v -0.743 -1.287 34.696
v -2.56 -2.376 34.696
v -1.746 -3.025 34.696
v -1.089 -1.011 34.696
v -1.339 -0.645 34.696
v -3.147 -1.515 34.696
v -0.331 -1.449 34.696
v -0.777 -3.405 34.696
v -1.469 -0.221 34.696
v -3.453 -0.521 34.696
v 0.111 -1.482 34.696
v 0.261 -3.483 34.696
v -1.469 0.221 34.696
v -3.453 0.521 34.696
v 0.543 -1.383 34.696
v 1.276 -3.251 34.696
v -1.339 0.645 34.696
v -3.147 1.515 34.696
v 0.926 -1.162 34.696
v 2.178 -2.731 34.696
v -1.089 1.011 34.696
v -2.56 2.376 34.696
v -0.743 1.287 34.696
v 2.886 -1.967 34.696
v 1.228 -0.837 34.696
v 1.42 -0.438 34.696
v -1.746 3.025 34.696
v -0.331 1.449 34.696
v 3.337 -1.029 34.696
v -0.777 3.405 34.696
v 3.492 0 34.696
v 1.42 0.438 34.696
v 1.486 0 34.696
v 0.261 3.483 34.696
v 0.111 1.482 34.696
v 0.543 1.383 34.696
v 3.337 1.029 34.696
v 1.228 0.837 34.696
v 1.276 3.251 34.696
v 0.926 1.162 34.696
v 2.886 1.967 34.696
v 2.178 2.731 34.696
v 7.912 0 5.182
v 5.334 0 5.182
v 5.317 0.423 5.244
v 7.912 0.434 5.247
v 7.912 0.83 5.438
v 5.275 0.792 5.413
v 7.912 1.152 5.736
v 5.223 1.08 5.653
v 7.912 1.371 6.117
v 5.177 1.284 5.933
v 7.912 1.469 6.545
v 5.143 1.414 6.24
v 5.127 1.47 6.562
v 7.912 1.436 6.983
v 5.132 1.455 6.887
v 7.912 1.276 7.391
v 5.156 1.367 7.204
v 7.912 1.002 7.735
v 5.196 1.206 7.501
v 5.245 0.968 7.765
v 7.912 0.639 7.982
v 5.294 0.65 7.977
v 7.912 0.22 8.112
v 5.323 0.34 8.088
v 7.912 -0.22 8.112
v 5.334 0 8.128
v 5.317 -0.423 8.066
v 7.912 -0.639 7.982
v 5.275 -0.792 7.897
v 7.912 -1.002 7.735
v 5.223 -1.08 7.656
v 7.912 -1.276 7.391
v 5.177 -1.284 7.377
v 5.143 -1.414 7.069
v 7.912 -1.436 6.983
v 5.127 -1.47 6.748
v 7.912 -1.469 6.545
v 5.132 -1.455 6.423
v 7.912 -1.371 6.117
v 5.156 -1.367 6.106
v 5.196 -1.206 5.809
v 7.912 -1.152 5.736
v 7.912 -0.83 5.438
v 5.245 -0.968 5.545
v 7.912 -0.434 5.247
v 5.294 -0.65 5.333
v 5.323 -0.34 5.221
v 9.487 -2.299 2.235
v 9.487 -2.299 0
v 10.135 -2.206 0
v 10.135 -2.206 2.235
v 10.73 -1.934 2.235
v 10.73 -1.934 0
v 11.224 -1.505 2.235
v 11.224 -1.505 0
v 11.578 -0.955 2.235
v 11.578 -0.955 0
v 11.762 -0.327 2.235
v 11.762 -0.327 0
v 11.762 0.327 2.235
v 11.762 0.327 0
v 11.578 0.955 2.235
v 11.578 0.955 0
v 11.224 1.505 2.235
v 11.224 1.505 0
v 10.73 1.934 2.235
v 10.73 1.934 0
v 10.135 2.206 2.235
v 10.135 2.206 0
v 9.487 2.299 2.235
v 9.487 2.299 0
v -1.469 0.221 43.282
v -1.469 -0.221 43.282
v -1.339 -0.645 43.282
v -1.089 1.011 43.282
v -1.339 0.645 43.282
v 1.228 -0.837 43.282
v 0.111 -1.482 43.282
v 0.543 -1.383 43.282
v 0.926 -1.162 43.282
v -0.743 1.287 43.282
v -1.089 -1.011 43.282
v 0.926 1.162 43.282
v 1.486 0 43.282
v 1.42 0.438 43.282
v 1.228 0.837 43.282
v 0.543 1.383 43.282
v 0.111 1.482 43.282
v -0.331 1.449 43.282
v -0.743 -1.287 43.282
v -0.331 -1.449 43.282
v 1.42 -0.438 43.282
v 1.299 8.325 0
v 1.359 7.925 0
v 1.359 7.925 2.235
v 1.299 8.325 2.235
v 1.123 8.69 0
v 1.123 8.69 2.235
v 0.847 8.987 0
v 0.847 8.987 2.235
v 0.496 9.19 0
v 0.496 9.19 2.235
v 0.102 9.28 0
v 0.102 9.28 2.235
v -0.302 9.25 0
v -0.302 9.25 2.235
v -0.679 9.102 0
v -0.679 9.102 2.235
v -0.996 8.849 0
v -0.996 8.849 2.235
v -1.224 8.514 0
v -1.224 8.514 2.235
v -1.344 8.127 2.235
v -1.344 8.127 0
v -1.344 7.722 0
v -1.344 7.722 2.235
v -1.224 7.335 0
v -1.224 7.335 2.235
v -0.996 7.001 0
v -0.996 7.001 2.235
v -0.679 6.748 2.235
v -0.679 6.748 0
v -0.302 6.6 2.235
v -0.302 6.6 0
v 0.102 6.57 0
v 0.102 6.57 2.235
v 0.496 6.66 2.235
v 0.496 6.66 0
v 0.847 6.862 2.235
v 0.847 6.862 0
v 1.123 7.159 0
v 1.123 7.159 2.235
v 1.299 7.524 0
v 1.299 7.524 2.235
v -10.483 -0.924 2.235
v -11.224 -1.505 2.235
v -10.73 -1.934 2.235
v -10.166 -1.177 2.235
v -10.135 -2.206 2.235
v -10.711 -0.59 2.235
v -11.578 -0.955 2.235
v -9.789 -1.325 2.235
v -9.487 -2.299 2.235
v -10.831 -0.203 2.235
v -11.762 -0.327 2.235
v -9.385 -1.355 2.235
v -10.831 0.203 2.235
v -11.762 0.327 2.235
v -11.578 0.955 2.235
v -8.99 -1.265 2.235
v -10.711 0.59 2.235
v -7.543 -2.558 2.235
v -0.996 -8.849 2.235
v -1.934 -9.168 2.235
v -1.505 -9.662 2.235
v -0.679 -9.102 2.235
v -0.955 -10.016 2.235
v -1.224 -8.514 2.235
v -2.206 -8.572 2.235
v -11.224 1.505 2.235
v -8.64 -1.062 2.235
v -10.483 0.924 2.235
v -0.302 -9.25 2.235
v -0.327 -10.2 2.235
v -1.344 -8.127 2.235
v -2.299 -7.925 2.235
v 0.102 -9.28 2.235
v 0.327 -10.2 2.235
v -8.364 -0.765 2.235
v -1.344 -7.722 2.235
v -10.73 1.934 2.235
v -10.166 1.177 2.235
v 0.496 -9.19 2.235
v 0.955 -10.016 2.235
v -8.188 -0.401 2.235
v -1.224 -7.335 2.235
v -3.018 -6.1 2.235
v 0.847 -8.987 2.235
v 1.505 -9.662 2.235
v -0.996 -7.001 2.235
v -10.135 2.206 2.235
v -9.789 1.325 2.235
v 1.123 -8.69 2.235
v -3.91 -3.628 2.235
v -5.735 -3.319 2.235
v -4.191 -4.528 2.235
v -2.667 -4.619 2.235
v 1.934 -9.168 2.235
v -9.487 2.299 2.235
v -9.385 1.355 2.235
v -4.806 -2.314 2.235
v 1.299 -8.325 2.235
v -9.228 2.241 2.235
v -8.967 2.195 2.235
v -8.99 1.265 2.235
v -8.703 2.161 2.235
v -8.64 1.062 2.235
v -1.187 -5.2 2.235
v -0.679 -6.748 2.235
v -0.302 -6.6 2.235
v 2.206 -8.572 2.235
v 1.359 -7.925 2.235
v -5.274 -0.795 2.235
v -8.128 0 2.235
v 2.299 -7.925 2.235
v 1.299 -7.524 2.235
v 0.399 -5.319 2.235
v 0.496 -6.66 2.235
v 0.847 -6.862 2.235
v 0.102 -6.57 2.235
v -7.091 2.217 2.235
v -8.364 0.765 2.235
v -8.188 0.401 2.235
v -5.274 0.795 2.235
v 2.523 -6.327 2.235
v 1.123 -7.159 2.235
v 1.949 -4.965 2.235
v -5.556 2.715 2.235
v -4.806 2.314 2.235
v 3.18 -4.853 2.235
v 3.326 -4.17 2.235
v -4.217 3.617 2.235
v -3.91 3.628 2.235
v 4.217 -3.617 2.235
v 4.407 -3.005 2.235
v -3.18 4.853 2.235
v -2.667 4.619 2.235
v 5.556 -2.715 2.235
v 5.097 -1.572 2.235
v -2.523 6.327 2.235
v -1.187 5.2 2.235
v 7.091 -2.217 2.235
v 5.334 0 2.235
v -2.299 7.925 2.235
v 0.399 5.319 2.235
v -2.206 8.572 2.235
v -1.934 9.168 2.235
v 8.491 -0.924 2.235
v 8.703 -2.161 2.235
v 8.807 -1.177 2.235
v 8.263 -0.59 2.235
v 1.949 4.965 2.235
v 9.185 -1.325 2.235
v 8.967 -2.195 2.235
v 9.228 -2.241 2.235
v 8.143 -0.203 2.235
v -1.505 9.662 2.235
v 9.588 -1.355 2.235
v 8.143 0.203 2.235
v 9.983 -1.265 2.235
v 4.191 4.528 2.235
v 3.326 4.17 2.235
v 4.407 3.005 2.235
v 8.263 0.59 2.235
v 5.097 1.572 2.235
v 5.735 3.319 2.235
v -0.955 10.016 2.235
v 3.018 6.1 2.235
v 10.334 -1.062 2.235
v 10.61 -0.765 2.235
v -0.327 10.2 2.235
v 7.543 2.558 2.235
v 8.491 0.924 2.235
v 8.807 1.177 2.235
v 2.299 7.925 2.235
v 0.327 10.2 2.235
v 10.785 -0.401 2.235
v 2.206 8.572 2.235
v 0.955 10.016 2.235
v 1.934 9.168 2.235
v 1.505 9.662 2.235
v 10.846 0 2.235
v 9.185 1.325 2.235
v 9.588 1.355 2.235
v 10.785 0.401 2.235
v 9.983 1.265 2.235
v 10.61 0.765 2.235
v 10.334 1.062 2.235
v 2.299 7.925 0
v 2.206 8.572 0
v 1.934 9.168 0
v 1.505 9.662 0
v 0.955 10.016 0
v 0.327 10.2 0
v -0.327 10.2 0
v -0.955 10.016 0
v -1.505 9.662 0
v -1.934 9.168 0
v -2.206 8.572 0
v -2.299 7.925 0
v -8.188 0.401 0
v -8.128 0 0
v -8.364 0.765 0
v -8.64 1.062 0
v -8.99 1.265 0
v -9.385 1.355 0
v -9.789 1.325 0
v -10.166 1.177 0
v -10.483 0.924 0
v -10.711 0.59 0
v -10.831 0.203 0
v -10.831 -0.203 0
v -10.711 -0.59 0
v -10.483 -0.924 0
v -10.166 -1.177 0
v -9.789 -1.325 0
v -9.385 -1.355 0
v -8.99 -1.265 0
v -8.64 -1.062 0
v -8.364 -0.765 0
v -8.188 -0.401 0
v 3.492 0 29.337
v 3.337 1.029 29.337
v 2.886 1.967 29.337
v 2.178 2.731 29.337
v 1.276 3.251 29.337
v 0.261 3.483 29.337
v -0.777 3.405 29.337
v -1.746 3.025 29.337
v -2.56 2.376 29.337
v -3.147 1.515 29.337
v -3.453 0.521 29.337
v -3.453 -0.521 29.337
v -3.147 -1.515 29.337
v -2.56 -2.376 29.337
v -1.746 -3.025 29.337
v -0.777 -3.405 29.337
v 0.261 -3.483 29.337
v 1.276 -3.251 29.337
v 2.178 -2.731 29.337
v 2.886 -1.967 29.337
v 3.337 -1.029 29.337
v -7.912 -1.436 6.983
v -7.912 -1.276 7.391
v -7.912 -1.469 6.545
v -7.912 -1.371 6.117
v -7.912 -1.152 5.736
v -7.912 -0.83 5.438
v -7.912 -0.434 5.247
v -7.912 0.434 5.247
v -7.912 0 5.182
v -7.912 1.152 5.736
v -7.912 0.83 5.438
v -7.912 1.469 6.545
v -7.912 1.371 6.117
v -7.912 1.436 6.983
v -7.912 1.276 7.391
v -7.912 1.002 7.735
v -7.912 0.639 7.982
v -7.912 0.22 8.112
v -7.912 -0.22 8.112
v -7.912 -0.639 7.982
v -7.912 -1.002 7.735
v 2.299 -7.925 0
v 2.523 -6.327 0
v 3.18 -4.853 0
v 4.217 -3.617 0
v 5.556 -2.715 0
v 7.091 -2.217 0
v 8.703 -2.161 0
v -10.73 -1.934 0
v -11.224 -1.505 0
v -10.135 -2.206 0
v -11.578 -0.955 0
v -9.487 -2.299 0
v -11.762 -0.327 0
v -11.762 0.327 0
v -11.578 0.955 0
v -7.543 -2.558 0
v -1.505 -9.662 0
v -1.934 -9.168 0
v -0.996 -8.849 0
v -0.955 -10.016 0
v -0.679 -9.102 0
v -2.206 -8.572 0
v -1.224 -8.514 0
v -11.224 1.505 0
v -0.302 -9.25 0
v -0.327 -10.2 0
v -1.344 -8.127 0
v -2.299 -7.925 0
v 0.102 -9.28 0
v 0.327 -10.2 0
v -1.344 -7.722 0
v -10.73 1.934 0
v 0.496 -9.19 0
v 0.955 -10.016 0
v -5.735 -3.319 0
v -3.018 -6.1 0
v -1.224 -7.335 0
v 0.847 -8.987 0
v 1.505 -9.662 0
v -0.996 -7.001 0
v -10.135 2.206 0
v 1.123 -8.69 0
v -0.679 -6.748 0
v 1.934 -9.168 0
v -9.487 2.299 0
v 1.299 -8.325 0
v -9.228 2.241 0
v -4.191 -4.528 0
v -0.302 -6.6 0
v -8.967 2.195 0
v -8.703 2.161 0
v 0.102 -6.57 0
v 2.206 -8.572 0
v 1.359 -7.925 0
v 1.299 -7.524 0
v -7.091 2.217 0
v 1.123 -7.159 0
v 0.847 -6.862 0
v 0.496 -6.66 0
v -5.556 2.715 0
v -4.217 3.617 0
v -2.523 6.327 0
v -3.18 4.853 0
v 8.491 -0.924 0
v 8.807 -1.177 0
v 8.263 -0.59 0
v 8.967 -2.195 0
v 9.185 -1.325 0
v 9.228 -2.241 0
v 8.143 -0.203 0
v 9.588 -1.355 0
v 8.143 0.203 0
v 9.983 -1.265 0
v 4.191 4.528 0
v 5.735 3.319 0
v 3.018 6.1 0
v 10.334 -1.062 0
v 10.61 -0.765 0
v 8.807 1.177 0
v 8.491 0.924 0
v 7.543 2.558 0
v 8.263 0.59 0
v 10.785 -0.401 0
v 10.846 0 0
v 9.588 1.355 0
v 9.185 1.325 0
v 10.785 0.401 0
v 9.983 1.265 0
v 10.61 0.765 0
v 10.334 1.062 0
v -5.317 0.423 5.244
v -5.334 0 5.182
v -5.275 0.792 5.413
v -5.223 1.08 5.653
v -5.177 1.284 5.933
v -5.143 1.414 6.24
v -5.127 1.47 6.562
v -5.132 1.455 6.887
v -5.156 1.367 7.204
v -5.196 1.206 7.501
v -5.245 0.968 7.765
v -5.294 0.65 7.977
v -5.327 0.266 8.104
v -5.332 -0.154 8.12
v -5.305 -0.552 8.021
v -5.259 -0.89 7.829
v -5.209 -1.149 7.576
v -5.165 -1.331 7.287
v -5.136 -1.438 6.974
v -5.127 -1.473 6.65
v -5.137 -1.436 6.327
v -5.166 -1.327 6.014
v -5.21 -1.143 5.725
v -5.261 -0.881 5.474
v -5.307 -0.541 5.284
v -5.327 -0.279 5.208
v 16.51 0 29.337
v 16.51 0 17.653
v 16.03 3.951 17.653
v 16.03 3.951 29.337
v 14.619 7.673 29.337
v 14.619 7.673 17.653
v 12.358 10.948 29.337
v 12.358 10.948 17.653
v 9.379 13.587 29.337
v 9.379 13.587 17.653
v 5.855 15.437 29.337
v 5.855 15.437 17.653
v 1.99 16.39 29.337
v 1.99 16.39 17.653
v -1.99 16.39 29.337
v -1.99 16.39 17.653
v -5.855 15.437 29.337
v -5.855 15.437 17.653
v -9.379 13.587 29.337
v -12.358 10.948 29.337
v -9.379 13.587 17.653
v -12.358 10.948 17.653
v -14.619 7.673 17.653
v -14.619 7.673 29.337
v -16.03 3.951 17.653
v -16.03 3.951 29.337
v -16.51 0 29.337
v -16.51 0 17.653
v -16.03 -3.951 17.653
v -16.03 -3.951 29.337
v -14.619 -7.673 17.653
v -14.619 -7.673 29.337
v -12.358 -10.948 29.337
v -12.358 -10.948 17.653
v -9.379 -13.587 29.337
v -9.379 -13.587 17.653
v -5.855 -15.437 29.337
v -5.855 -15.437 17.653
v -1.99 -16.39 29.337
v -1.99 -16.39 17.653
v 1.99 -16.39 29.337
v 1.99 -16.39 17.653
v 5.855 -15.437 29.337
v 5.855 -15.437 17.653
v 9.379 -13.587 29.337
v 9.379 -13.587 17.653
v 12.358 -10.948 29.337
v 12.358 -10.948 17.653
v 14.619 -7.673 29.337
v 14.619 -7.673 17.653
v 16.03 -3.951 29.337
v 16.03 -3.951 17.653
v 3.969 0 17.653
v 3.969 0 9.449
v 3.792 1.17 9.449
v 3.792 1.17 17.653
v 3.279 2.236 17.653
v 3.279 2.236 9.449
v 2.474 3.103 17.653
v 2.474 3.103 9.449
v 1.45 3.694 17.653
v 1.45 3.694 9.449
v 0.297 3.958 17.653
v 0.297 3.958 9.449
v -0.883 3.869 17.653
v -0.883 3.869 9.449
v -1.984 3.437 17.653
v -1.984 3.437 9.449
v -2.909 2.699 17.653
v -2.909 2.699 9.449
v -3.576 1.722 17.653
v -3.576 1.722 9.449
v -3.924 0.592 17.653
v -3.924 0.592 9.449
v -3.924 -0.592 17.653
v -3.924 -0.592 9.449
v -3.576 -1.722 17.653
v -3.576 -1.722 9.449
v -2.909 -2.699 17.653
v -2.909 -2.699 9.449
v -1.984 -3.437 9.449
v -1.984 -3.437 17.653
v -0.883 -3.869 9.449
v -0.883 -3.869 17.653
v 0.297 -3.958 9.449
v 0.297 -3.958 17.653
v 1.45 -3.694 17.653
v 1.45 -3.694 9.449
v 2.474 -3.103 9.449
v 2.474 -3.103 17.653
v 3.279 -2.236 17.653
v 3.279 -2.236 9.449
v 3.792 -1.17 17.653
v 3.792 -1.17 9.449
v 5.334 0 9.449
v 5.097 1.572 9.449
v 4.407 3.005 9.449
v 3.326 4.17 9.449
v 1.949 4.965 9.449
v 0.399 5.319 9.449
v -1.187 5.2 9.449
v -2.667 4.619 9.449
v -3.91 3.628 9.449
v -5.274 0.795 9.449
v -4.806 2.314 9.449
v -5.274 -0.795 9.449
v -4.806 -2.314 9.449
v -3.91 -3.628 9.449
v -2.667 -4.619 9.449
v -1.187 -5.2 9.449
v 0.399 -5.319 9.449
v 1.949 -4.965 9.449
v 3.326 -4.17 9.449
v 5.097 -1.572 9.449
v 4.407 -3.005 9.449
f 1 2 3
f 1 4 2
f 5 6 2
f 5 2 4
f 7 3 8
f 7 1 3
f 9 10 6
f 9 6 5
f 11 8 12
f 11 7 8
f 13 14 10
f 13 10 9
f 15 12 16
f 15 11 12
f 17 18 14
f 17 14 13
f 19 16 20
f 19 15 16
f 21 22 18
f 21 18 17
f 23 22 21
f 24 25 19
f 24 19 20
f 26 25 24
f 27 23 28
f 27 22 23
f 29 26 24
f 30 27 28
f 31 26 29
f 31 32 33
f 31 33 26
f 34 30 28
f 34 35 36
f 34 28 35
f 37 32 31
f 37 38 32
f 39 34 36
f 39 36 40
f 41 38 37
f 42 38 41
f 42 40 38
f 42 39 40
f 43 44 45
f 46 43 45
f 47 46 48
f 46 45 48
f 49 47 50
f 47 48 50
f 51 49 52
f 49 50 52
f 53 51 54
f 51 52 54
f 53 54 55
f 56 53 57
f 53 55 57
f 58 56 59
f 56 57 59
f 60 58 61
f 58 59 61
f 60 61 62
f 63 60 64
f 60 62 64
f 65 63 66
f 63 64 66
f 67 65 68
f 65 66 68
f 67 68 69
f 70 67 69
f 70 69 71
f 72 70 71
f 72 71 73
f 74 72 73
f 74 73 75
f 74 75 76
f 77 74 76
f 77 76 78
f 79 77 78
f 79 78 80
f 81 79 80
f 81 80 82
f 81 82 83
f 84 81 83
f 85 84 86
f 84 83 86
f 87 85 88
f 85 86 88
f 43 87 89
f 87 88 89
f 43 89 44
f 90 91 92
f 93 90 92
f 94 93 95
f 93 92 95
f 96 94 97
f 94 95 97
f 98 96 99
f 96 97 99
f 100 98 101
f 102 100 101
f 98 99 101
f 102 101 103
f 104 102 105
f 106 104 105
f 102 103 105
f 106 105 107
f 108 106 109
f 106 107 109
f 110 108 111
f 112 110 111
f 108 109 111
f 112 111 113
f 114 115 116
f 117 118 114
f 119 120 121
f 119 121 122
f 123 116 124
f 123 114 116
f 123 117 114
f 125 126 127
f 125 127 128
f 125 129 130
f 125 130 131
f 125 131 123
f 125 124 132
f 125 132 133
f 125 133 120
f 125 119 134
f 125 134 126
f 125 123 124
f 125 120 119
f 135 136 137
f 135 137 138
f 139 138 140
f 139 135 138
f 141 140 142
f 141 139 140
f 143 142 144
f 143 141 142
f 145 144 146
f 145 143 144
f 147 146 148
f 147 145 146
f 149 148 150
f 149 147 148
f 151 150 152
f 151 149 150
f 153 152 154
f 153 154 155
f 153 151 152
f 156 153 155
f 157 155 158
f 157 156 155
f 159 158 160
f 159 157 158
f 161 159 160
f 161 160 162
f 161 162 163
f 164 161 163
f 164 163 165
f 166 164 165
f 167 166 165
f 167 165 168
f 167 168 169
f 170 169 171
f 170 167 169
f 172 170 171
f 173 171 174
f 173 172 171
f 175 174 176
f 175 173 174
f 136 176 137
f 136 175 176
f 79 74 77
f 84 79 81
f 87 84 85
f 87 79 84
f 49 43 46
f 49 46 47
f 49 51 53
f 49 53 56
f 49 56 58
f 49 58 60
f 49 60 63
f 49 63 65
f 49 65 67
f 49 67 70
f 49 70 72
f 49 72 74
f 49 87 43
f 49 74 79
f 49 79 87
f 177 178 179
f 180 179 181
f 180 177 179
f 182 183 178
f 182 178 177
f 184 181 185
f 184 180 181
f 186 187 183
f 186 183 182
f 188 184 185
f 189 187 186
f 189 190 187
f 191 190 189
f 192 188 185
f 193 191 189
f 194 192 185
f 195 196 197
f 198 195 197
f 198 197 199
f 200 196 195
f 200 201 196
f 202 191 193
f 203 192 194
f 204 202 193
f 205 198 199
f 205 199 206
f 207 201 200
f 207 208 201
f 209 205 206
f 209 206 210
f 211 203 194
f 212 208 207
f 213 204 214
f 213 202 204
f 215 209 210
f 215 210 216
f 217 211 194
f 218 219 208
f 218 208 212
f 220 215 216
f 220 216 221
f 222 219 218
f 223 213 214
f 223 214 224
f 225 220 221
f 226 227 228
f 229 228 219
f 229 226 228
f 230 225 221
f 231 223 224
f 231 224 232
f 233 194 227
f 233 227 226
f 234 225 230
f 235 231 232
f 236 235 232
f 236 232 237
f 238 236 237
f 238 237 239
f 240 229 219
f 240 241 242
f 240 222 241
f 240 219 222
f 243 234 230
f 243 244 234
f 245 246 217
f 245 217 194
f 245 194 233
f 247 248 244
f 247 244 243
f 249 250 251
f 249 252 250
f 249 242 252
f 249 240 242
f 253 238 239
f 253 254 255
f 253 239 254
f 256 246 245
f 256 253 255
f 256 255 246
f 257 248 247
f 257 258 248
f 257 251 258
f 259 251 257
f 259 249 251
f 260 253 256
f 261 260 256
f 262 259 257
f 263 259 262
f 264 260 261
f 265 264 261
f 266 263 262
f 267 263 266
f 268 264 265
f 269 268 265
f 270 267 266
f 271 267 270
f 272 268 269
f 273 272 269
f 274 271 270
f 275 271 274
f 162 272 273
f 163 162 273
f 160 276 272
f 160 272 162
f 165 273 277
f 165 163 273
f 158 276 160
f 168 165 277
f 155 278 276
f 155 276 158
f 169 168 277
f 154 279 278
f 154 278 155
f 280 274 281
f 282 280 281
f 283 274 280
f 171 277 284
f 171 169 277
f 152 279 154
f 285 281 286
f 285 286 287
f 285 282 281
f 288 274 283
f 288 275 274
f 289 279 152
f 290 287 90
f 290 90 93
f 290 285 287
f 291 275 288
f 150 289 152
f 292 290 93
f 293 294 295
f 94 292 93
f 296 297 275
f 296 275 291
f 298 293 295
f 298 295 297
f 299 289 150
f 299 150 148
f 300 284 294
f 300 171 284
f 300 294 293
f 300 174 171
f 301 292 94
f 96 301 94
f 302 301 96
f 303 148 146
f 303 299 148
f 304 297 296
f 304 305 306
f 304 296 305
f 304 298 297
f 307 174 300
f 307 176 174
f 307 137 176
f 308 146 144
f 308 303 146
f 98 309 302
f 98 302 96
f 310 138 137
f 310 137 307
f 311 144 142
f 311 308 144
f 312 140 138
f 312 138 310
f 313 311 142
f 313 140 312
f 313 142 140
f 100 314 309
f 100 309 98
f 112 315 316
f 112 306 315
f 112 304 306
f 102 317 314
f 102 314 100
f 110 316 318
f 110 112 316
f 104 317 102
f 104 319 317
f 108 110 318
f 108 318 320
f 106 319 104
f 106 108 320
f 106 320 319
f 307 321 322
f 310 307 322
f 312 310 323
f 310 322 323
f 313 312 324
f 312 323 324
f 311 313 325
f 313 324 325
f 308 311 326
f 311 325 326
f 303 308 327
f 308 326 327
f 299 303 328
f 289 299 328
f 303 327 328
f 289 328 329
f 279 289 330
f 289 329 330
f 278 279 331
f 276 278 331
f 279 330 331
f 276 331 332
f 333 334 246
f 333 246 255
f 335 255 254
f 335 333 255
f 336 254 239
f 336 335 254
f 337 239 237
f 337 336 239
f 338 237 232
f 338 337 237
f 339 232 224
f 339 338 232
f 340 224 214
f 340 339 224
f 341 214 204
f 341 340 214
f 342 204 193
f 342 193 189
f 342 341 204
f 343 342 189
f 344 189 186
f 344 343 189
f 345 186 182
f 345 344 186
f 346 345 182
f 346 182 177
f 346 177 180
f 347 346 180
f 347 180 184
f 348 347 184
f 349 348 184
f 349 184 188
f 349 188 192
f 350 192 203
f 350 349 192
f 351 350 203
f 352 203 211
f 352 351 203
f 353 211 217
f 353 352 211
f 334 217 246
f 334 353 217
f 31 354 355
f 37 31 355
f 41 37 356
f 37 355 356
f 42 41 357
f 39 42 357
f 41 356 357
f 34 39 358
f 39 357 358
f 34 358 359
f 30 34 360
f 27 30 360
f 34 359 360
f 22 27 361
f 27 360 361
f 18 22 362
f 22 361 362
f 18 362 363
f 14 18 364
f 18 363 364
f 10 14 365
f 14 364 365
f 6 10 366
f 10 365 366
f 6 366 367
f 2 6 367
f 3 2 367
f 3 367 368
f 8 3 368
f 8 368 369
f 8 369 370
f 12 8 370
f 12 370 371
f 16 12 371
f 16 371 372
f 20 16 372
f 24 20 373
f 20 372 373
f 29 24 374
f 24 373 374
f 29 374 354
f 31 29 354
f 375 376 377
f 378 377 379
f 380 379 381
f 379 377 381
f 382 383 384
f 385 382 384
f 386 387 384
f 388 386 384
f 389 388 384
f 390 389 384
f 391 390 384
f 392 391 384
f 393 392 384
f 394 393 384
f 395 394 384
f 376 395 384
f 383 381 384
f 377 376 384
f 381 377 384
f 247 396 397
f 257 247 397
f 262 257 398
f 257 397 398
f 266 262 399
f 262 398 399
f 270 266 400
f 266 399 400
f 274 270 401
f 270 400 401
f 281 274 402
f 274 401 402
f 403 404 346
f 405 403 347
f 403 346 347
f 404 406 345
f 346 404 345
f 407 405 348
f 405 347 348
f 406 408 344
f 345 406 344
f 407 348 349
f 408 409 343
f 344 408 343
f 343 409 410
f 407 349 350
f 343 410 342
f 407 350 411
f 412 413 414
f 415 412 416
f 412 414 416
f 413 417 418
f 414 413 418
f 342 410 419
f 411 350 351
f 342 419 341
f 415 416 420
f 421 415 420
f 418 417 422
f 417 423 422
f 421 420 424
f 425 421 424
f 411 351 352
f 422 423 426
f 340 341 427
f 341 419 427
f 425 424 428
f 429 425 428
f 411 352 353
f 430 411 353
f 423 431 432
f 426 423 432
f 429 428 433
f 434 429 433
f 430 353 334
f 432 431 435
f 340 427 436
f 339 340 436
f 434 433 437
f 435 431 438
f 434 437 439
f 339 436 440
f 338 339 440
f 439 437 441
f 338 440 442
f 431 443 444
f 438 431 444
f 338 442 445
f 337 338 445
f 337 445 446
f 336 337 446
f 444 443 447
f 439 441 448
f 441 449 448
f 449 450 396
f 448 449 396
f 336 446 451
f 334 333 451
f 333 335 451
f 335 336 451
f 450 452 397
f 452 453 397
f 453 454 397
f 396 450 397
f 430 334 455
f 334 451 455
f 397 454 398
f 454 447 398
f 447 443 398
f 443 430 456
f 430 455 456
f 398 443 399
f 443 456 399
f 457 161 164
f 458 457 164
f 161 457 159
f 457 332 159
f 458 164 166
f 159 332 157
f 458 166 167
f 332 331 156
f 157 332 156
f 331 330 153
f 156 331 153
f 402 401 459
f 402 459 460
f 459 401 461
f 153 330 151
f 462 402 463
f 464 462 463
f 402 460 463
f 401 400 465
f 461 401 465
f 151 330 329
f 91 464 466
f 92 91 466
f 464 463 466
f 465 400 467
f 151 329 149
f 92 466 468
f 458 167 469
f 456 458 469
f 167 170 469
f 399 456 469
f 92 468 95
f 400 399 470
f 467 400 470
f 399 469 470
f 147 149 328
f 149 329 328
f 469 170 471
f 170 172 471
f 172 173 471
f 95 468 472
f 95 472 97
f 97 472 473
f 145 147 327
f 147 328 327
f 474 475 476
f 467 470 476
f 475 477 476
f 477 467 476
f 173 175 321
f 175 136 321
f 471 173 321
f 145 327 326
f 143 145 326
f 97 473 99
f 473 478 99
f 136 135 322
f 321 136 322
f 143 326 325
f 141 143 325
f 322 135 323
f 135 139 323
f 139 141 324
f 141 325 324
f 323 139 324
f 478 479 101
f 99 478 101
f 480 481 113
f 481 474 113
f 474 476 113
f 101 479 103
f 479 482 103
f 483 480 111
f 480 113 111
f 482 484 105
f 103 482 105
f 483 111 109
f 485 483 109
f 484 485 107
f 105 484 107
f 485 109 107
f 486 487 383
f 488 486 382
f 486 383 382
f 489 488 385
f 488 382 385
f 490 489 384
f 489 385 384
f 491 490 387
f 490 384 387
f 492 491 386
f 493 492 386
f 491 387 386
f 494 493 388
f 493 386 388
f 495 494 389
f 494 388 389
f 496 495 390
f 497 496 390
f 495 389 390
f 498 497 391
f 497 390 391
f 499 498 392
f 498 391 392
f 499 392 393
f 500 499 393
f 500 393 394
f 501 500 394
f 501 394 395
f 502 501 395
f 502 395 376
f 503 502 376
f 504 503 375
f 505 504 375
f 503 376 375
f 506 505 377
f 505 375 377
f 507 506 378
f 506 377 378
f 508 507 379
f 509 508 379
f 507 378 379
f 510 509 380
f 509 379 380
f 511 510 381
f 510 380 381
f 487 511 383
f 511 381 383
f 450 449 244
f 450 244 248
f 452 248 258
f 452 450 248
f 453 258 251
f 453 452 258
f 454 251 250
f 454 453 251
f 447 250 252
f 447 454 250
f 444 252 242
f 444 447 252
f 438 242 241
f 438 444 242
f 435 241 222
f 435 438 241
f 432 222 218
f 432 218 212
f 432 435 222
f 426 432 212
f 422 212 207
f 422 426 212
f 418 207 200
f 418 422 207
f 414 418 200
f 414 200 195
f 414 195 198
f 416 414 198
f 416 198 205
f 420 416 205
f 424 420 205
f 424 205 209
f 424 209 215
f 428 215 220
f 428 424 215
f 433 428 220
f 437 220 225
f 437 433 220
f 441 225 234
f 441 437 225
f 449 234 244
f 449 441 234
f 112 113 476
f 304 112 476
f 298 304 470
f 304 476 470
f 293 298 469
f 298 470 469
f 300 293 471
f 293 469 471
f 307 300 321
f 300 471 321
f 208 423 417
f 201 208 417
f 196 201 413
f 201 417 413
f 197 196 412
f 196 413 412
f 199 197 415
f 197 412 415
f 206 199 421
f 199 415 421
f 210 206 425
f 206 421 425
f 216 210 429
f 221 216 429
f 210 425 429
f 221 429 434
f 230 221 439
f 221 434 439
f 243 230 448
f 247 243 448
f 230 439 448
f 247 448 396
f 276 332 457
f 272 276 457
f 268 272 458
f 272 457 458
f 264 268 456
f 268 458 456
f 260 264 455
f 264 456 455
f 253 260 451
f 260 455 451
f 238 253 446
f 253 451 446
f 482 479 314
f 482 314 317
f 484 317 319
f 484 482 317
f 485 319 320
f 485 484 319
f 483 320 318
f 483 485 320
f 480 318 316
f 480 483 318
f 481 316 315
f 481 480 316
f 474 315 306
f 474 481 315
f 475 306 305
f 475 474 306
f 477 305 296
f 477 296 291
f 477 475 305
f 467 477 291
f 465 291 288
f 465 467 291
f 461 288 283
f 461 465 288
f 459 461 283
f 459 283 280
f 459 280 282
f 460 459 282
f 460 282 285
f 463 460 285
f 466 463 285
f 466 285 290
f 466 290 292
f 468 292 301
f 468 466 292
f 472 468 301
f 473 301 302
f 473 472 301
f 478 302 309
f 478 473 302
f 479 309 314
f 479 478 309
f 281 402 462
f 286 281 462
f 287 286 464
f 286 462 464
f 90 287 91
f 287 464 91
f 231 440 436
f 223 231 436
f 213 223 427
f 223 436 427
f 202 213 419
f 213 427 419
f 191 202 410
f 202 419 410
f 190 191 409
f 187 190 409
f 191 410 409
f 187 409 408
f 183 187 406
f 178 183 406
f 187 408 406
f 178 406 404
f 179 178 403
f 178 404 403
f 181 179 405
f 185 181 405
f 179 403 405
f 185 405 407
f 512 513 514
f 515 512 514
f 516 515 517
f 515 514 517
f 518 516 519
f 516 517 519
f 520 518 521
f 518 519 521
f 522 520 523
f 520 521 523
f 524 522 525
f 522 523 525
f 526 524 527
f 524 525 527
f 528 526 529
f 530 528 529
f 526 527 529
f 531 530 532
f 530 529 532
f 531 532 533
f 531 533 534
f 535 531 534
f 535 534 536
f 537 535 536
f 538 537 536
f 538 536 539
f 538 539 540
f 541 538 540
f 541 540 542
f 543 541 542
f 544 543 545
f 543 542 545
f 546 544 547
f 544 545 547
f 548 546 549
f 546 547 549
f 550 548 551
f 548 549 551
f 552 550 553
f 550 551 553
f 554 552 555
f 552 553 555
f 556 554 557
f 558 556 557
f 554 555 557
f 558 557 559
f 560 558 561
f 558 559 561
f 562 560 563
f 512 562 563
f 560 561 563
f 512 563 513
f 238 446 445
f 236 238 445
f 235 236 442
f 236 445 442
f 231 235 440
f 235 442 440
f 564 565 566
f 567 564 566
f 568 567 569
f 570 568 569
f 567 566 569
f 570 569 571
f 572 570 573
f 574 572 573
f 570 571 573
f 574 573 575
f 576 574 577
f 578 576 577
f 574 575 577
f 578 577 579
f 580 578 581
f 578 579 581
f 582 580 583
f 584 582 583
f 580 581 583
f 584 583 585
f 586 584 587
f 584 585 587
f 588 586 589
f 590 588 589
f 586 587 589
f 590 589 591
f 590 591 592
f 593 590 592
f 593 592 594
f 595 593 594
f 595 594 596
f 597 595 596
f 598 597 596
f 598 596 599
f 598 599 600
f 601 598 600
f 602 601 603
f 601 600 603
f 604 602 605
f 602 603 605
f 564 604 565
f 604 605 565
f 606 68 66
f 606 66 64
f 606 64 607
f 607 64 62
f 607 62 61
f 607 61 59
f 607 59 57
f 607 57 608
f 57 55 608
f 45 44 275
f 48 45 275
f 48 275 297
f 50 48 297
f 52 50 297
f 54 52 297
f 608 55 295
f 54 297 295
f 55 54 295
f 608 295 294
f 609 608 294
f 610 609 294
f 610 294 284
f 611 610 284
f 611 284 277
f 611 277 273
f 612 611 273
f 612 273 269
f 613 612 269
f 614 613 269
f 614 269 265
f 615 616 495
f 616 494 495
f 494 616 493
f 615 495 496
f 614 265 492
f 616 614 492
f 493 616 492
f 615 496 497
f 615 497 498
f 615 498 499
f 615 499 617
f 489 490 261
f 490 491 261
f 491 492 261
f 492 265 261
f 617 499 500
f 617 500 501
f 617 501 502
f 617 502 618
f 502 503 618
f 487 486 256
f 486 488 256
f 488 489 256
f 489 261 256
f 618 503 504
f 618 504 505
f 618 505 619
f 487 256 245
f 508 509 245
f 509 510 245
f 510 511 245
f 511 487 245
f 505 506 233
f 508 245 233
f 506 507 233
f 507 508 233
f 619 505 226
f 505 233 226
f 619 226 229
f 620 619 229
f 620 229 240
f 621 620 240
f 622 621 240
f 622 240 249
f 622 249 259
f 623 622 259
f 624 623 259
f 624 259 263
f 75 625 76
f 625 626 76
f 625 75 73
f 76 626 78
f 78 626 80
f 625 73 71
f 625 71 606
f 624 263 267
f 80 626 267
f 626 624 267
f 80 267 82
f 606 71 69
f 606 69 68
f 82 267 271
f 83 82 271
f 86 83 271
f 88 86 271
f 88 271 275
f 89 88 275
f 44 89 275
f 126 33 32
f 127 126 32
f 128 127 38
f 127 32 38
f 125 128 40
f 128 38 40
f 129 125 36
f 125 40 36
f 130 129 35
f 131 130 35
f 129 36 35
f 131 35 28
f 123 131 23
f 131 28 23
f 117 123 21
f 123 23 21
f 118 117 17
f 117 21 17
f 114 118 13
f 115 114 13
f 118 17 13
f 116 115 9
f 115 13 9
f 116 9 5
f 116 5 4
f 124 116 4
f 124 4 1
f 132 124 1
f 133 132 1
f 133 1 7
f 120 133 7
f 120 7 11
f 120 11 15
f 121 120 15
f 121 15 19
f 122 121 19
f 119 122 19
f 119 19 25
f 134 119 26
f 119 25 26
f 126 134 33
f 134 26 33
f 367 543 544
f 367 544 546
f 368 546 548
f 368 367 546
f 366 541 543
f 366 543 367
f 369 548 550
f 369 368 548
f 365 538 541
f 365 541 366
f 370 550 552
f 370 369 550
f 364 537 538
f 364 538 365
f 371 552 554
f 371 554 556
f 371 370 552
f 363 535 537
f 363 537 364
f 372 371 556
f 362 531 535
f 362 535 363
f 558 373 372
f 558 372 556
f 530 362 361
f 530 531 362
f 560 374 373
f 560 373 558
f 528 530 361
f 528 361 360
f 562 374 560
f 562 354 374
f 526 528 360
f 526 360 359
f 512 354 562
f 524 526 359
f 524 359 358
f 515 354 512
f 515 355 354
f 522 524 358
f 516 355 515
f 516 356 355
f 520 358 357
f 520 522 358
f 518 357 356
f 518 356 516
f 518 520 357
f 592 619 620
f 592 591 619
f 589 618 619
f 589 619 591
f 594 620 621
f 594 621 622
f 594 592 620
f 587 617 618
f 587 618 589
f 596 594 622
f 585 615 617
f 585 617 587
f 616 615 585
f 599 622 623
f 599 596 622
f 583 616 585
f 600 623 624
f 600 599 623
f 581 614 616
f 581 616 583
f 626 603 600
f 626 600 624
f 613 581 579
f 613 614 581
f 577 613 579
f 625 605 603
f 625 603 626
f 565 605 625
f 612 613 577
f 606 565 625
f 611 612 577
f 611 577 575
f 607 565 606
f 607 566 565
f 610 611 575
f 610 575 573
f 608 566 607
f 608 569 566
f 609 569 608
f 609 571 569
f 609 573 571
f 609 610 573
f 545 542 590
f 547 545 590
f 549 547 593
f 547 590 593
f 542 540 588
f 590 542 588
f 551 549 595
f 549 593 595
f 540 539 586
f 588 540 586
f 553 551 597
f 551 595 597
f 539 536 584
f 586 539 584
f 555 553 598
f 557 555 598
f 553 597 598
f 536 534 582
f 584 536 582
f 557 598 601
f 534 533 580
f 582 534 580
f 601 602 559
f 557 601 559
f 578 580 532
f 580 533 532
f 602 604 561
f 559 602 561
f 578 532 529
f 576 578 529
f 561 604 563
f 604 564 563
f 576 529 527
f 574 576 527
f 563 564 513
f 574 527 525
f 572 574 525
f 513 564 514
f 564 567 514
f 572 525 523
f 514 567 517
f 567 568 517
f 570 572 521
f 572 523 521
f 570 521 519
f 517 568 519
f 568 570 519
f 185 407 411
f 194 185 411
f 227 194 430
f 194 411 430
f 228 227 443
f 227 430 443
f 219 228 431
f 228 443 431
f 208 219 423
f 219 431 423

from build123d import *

# Parameters (mm, degrees)
SKETCH1_R                = 1.3589
BOSS_EXTRUDE1_DEPTH      = 2.2352
SKETCH2_R                = 5.334
BOSS_EXTRUDE2_DEPTH      = 7.2136
BOSS_EXTRUDE3_DEPTH      = 7.9121
BOSS_EXTRUDE3_DEPTH_BACK = 7.9121
SKETCH3_R                = 1.4732
SKETCH4_R                = 3.96875
BOSS_EXTRUDE4_DEPTH      = 8.2042
SKETCH5_R                = 16.51
BOSS_EXTRUDE5_DEPTH      = 11.684
SKETCH6_R                = 3.4925
BOSS_EXTRUDE6_DEPTH      = 5.3594
SKETCH7_R                = 1.4859
BOSS_EXTRUDE7_DEPTH      = 8.5852


with BuildPart() as part:
    # Sketch1 → Boss-Extrude1 (new body)
    with BuildSketch(Plane.XY):
        with BuildLine():
            ThreePointArc((2.2987, -7.9248), (4.217475252, -3.616655942), (8.703337155, -2.161030069))
            ThreePointArc((8.703337155, -2.161030069), (9.097483524, -2.216404696), (9.4869, -2.2987))
            ThreePointArc((9.4869, -2.2987), (11.7856, 0), (9.4869, 2.2987))
            ThreePointArc((9.4869, 2.2987), (4.922822315, 3.872455712), (2.2987, 7.9248))
            ThreePointArc((2.2987, 7.9248), (0, 10.2235), (-2.2987, 7.9248))
            ThreePointArc((-2.2987, 7.9248), (-4.217475252, 3.616655942), (-8.703337155, 2.161030069))
            ThreePointArc((-8.703337155, 2.161030069), (-9.097483524, 2.216404696), (-9.4869, 2.2987))
            ThreePointArc((-9.4869, 2.2987), (-11.7856, 0), (-9.4869, -2.2987))
            ThreePointArc((-9.4869, -2.2987), (-4.922822315, -3.872455712), (-2.2987, -7.9248))
            ThreePointArc((-2.2987, -7.9248), (0, -10.2235), (2.2987, -7.9248))
        make_face()
        with Locations((0, -7.9248)):
            Circle(SKETCH1_R, mode=Mode.SUBTRACT)
        with Locations((-9.4869, 0)):
            Circle(SKETCH1_R, mode=Mode.SUBTRACT)
        with Locations((0, 7.9248)):
            Circle(SKETCH1_R, mode=Mode.SUBTRACT)
        with Locations((9.4869, 0)):
            Circle(SKETCH1_R, mode=Mode.SUBTRACT)
    extrude(amount=BOSS_EXTRUDE1_DEPTH)

    # Sketch2 → Boss-Extrude2 (add)
    with BuildSketch(Plane.XY.offset(2.2352)):
        Circle(SKETCH2_R)
    extrude(amount=BOSS_EXTRUDE2_DEPTH)

    # Sketch3 → Boss-Extrude3 (add, two sides: drawn at the far end of the back side and taken through both)
    with BuildSketch(Plane(origin=(0, 0, 0), x_dir=(0, 0, -1), z_dir=(1, 0, 0)).offset(-BOSS_EXTRUDE3_DEPTH_BACK)):
        with Locations((-6.6548, 0)):
            Circle(SKETCH3_R)
    extrude(amount=BOSS_EXTRUDE3_DEPTH + BOSS_EXTRUDE3_DEPTH_BACK)

    # Sketch4 → Boss-Extrude4 (add)
    with BuildSketch(Plane.XY.offset(9.4488)):
        Circle(SKETCH4_R)
    extrude(amount=BOSS_EXTRUDE4_DEPTH)

    # Sketch5 → Boss-Extrude5 (add)
    with BuildSketch(Plane.XY.offset(17.653)):
        Circle(SKETCH5_R)
    extrude(amount=BOSS_EXTRUDE5_DEPTH)

    # Sketch6 → Boss-Extrude6 (add)
    with BuildSketch(Plane.XY.offset(29.337)):
        Circle(SKETCH6_R)
    extrude(amount=BOSS_EXTRUDE6_DEPTH)

    # Sketch7 → Boss-Extrude7 (add)
    with BuildSketch(Plane.XY.offset(34.6964)):
        Circle(SKETCH7_R)
    extrude(amount=BOSS_EXTRUDE7_DEPTH)


solid = part.part
